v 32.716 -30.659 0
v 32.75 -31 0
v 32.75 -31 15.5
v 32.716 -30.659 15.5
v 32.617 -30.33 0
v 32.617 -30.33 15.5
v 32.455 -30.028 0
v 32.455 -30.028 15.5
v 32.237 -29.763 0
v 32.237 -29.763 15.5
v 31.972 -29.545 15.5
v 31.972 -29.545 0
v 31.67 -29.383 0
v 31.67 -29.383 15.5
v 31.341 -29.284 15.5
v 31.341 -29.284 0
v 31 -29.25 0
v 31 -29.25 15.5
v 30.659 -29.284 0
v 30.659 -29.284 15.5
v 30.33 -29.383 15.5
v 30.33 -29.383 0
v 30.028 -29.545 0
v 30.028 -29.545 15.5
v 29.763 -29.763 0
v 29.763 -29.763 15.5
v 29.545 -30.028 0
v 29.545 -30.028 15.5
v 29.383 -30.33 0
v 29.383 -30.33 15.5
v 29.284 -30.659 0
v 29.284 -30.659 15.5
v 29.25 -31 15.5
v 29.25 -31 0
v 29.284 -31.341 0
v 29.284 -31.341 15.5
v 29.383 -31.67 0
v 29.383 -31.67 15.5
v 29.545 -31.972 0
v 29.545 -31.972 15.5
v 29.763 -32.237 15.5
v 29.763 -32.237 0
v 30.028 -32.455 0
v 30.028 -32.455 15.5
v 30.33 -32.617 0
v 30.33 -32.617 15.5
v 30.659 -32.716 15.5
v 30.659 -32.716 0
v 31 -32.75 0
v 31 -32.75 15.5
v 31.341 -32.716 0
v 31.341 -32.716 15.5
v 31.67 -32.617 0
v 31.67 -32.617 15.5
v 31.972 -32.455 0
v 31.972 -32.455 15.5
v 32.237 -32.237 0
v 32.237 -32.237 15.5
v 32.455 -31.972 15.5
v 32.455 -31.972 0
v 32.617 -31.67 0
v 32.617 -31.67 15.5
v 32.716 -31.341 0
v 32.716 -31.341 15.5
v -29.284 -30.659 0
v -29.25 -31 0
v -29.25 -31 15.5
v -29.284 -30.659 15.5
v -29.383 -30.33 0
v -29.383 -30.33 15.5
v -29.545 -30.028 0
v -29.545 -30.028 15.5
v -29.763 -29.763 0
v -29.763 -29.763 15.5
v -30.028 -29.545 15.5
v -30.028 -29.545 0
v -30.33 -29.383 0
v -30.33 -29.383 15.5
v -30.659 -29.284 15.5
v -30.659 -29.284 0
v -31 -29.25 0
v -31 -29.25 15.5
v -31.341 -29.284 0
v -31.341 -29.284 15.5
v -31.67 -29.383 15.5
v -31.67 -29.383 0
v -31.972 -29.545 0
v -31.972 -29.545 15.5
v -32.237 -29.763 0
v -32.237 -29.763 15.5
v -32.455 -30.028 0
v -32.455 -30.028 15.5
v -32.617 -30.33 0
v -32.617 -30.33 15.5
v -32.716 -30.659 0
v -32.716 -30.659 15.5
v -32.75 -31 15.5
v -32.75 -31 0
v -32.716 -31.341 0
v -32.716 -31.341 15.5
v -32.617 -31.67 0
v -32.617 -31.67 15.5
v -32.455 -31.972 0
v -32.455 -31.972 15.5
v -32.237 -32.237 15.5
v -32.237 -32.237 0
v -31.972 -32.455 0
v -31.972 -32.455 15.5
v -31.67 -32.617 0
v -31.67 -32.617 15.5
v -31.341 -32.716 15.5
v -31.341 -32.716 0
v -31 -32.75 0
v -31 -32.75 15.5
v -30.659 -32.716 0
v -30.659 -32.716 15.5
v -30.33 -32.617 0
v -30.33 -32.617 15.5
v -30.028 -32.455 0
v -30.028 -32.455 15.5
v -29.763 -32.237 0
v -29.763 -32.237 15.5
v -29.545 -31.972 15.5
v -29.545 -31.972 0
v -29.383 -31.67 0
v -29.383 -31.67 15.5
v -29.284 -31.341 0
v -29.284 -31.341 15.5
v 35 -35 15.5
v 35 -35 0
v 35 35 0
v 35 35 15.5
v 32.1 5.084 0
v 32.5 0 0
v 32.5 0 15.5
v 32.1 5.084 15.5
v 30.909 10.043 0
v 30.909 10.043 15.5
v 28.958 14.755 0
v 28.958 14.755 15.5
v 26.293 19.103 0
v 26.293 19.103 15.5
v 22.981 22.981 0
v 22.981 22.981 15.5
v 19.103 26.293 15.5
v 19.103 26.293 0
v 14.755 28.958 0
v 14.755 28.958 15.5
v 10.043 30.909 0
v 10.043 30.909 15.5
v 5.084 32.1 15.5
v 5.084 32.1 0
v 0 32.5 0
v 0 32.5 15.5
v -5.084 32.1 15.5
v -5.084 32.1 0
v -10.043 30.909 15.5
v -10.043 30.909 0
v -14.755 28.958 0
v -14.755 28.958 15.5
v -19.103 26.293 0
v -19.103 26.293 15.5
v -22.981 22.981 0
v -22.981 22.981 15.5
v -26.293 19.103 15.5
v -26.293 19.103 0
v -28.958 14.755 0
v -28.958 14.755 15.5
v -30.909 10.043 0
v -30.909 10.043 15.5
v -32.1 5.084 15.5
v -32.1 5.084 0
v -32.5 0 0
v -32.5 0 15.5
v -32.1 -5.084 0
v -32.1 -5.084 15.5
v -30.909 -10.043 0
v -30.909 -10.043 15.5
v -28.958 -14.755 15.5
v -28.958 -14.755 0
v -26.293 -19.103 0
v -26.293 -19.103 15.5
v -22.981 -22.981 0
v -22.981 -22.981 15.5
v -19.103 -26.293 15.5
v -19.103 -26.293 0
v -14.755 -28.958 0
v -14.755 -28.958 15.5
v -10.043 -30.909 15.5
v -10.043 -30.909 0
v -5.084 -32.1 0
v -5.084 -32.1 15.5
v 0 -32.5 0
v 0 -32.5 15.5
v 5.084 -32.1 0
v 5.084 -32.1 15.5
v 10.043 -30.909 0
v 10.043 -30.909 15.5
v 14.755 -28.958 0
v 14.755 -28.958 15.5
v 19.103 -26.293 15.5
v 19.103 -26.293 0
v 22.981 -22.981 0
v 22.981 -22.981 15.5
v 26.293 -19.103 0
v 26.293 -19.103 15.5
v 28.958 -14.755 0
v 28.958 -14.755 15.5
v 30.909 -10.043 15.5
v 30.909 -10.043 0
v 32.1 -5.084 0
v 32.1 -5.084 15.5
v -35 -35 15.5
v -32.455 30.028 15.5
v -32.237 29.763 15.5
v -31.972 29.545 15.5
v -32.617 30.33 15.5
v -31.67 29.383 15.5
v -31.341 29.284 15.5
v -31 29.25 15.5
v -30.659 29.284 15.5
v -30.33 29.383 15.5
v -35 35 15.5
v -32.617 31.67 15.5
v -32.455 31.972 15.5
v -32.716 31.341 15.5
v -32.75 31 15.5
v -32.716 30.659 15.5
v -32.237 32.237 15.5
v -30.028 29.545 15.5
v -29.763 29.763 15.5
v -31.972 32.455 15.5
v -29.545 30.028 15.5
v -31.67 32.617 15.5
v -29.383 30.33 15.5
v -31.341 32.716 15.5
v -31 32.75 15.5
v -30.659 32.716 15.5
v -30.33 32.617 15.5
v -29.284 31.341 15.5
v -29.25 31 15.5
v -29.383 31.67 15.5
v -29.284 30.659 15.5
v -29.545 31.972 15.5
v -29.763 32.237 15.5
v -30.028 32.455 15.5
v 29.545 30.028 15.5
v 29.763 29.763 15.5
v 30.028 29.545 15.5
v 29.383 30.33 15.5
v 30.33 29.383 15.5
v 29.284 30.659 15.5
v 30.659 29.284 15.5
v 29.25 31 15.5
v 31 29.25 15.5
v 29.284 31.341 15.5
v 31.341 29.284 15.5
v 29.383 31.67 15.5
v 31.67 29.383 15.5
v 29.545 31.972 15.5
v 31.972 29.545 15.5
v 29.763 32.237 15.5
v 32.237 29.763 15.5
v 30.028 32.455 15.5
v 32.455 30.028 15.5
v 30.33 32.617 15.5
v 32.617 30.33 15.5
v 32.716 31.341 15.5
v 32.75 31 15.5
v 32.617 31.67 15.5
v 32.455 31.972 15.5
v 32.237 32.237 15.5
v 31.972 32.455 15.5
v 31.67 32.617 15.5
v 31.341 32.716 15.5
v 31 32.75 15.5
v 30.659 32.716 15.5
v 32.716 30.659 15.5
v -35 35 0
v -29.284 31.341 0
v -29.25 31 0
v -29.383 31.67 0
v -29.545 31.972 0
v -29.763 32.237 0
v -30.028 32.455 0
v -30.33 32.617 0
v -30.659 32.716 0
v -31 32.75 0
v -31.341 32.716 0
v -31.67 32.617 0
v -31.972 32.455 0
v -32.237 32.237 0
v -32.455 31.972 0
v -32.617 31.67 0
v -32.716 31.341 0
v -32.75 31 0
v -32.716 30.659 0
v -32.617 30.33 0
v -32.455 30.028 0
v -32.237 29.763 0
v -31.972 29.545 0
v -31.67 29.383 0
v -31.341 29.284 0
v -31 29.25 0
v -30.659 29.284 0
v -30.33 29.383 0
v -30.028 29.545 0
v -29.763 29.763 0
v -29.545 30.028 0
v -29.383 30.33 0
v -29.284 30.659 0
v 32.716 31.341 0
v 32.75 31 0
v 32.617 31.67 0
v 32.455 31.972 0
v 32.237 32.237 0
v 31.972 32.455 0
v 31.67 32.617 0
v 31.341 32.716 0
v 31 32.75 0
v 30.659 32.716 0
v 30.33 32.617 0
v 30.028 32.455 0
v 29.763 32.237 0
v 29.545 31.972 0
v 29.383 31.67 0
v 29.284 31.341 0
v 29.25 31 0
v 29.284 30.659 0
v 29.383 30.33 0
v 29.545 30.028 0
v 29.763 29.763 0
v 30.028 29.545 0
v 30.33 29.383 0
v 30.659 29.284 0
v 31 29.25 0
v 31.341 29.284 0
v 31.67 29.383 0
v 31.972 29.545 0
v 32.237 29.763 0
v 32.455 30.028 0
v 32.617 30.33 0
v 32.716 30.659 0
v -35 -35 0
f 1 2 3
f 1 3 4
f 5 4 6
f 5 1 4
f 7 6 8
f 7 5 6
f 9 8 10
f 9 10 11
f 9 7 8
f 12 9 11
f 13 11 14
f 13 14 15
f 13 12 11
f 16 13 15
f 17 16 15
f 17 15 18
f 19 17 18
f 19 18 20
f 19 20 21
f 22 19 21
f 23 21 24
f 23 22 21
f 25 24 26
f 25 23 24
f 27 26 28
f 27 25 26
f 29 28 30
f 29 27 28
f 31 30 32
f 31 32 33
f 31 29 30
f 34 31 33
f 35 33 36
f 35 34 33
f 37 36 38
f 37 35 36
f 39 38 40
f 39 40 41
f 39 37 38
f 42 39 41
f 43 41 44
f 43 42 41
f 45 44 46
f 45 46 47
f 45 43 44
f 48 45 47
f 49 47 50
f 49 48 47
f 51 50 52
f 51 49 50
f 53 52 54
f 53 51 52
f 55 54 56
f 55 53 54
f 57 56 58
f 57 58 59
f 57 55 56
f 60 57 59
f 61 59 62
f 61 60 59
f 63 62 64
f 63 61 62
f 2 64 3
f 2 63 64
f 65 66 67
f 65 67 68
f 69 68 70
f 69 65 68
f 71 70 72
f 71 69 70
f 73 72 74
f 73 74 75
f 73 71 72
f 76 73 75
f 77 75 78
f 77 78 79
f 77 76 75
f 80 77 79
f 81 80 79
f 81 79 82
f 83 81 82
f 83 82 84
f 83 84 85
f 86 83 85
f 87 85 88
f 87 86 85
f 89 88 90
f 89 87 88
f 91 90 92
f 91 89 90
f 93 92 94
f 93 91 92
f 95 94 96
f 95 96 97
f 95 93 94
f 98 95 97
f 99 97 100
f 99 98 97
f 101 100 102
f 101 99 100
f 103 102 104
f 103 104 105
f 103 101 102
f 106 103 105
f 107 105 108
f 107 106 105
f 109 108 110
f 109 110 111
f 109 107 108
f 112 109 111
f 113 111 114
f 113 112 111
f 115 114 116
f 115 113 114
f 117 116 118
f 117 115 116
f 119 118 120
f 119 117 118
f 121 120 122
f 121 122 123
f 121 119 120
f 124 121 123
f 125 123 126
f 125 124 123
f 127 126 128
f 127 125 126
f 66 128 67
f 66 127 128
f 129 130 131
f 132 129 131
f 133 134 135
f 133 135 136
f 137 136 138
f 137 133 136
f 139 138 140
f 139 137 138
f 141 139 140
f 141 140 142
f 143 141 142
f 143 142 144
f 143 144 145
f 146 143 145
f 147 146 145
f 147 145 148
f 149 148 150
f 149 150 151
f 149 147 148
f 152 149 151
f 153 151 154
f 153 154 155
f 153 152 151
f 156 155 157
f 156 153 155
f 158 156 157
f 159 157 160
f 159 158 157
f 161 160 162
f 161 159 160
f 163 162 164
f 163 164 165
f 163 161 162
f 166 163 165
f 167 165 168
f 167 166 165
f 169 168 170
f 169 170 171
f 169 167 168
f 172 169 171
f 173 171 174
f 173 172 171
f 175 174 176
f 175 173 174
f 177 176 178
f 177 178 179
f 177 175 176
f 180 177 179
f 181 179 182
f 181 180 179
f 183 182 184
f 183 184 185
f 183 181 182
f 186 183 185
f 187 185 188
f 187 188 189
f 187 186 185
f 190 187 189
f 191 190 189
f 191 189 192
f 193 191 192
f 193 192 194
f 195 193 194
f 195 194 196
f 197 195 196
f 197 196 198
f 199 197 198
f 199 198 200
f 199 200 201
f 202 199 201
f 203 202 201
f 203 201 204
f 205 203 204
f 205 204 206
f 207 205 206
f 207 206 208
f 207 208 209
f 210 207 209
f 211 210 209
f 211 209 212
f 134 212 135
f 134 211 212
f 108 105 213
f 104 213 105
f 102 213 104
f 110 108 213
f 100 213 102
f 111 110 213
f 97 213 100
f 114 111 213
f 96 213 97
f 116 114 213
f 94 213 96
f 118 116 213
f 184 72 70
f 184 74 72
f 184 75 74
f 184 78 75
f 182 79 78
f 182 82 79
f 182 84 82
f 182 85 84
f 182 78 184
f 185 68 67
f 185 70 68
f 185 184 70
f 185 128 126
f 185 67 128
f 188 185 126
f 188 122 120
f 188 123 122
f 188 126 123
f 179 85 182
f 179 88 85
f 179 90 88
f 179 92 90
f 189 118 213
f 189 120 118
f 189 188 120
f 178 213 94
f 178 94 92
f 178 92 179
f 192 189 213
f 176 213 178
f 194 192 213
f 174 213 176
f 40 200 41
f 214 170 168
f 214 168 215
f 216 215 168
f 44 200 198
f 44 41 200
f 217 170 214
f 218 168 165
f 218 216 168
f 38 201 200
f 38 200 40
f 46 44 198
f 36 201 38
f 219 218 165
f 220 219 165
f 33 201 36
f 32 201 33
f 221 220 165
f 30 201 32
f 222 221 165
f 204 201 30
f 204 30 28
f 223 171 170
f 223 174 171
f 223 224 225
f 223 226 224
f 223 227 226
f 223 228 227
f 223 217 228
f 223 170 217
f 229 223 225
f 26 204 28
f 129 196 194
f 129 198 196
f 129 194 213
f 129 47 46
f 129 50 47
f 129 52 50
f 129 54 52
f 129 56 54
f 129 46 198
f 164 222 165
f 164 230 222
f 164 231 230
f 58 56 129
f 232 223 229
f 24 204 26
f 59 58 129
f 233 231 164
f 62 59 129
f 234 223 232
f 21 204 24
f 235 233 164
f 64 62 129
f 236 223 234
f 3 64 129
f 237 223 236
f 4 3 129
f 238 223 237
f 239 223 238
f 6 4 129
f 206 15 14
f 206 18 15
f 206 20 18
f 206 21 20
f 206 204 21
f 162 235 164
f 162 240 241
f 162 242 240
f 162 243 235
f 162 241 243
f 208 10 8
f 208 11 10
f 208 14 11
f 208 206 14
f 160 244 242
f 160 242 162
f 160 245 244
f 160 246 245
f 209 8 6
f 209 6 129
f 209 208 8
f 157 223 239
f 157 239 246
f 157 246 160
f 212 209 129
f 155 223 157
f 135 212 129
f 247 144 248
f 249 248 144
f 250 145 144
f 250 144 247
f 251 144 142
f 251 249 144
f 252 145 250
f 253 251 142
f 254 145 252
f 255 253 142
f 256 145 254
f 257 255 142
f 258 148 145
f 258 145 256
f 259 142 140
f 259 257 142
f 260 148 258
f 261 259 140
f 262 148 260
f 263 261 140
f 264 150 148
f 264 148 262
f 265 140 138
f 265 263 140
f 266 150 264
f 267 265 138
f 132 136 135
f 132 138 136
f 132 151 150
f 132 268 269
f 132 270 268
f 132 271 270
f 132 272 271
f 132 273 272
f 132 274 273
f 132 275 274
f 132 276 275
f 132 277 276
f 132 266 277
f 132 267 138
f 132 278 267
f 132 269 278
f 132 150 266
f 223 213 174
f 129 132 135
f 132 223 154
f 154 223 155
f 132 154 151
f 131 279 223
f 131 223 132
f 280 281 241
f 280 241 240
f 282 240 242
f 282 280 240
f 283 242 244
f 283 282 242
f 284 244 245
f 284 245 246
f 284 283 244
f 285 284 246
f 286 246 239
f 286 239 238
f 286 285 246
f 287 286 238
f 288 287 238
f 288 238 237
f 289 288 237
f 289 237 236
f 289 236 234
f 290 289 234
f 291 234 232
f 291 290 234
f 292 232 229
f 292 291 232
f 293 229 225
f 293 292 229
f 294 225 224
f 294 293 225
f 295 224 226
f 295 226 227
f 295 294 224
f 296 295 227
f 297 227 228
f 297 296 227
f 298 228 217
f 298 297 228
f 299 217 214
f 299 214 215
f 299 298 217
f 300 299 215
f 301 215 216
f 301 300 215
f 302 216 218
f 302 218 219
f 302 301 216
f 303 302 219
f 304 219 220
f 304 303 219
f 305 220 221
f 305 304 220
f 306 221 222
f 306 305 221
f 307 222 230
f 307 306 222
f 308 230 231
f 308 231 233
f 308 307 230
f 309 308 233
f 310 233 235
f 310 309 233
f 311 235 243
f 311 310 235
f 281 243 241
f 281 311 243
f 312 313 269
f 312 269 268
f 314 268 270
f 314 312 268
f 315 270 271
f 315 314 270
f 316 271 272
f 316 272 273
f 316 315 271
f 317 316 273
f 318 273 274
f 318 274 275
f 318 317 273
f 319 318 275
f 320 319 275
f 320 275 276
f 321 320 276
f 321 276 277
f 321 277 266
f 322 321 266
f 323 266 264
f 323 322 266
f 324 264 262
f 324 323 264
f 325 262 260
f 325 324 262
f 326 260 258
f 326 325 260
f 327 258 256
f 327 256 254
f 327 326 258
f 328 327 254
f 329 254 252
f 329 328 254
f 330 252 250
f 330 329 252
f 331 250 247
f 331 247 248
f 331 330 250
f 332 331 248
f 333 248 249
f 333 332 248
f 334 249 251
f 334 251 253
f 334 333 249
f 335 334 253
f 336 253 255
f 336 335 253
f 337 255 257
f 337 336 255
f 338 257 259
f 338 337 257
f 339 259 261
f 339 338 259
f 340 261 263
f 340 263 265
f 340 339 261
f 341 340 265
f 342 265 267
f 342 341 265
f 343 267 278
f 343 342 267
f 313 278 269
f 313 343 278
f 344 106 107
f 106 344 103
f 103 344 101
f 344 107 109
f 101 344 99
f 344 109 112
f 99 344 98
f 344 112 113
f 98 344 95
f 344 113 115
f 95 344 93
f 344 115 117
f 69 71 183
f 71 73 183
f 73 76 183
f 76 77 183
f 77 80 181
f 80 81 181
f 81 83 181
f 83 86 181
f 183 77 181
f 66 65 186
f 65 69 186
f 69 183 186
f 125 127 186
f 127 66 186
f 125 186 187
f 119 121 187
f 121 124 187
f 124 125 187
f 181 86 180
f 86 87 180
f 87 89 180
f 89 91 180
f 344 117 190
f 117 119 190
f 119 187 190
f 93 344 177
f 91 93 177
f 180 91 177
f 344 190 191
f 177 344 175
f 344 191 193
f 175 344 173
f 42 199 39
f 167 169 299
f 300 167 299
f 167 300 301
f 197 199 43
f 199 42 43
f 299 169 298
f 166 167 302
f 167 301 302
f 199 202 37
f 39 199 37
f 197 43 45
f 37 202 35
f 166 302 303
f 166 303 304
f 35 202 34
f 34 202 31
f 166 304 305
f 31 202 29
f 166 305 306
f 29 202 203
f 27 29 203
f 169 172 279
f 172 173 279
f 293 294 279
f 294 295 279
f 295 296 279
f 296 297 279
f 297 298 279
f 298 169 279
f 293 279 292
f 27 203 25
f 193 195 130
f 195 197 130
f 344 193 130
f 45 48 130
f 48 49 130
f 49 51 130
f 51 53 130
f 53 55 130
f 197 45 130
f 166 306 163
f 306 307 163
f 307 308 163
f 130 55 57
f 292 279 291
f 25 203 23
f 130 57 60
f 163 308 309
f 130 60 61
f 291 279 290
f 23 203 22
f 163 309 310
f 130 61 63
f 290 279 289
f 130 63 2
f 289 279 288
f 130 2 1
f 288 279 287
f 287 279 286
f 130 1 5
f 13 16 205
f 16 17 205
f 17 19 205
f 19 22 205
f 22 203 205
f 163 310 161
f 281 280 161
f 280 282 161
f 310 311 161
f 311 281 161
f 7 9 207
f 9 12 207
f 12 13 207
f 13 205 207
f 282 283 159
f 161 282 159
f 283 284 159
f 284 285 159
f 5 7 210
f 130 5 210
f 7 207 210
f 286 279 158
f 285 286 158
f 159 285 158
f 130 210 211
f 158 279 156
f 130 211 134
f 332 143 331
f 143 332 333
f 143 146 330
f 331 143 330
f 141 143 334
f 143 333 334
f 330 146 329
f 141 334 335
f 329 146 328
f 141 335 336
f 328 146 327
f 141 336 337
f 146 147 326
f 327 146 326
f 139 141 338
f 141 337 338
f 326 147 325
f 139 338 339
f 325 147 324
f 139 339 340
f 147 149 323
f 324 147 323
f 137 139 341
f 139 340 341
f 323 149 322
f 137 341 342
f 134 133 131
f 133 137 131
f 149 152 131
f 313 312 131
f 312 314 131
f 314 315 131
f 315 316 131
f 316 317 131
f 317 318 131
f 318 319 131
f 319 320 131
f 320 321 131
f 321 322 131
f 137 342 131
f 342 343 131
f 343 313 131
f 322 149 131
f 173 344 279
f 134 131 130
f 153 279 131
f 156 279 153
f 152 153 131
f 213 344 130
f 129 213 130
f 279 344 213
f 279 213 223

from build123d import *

# Parameters (mm, degrees)
ESBO_O1_W                = 70
ESBO_O1_H                = 70
ESBO_O1_R                = 1.75
ESBO_O1_R_2              = 32.5
RESSALTO_EXTRUS_O1_DEPTH = 15.5


with BuildPart() as part:
    # Esboço1 → Ressalto-extrusão1 (new body)
    with BuildSketch(Plane.XY):
        Rectangle(ESBO_O1_W, ESBO_O1_H)
        with Locations((-31, -31)):
            Circle(ESBO_O1_R, mode=Mode.SUBTRACT)
        with Locations((31, -31)):
            Circle(ESBO_O1_R, mode=Mode.SUBTRACT)
        with Locations((31, 31)):
            Circle(ESBO_O1_R, mode=Mode.SUBTRACT)
        Circle(ESBO_O1_R_2, mode=Mode.SUBTRACT)
        with Locations((-31, 31)):
            Circle(ESBO_O1_R, mode=Mode.SUBTRACT)
    extrude(amount=RESSALTO_EXTRUS_O1_DEPTH)


solid = part.part
